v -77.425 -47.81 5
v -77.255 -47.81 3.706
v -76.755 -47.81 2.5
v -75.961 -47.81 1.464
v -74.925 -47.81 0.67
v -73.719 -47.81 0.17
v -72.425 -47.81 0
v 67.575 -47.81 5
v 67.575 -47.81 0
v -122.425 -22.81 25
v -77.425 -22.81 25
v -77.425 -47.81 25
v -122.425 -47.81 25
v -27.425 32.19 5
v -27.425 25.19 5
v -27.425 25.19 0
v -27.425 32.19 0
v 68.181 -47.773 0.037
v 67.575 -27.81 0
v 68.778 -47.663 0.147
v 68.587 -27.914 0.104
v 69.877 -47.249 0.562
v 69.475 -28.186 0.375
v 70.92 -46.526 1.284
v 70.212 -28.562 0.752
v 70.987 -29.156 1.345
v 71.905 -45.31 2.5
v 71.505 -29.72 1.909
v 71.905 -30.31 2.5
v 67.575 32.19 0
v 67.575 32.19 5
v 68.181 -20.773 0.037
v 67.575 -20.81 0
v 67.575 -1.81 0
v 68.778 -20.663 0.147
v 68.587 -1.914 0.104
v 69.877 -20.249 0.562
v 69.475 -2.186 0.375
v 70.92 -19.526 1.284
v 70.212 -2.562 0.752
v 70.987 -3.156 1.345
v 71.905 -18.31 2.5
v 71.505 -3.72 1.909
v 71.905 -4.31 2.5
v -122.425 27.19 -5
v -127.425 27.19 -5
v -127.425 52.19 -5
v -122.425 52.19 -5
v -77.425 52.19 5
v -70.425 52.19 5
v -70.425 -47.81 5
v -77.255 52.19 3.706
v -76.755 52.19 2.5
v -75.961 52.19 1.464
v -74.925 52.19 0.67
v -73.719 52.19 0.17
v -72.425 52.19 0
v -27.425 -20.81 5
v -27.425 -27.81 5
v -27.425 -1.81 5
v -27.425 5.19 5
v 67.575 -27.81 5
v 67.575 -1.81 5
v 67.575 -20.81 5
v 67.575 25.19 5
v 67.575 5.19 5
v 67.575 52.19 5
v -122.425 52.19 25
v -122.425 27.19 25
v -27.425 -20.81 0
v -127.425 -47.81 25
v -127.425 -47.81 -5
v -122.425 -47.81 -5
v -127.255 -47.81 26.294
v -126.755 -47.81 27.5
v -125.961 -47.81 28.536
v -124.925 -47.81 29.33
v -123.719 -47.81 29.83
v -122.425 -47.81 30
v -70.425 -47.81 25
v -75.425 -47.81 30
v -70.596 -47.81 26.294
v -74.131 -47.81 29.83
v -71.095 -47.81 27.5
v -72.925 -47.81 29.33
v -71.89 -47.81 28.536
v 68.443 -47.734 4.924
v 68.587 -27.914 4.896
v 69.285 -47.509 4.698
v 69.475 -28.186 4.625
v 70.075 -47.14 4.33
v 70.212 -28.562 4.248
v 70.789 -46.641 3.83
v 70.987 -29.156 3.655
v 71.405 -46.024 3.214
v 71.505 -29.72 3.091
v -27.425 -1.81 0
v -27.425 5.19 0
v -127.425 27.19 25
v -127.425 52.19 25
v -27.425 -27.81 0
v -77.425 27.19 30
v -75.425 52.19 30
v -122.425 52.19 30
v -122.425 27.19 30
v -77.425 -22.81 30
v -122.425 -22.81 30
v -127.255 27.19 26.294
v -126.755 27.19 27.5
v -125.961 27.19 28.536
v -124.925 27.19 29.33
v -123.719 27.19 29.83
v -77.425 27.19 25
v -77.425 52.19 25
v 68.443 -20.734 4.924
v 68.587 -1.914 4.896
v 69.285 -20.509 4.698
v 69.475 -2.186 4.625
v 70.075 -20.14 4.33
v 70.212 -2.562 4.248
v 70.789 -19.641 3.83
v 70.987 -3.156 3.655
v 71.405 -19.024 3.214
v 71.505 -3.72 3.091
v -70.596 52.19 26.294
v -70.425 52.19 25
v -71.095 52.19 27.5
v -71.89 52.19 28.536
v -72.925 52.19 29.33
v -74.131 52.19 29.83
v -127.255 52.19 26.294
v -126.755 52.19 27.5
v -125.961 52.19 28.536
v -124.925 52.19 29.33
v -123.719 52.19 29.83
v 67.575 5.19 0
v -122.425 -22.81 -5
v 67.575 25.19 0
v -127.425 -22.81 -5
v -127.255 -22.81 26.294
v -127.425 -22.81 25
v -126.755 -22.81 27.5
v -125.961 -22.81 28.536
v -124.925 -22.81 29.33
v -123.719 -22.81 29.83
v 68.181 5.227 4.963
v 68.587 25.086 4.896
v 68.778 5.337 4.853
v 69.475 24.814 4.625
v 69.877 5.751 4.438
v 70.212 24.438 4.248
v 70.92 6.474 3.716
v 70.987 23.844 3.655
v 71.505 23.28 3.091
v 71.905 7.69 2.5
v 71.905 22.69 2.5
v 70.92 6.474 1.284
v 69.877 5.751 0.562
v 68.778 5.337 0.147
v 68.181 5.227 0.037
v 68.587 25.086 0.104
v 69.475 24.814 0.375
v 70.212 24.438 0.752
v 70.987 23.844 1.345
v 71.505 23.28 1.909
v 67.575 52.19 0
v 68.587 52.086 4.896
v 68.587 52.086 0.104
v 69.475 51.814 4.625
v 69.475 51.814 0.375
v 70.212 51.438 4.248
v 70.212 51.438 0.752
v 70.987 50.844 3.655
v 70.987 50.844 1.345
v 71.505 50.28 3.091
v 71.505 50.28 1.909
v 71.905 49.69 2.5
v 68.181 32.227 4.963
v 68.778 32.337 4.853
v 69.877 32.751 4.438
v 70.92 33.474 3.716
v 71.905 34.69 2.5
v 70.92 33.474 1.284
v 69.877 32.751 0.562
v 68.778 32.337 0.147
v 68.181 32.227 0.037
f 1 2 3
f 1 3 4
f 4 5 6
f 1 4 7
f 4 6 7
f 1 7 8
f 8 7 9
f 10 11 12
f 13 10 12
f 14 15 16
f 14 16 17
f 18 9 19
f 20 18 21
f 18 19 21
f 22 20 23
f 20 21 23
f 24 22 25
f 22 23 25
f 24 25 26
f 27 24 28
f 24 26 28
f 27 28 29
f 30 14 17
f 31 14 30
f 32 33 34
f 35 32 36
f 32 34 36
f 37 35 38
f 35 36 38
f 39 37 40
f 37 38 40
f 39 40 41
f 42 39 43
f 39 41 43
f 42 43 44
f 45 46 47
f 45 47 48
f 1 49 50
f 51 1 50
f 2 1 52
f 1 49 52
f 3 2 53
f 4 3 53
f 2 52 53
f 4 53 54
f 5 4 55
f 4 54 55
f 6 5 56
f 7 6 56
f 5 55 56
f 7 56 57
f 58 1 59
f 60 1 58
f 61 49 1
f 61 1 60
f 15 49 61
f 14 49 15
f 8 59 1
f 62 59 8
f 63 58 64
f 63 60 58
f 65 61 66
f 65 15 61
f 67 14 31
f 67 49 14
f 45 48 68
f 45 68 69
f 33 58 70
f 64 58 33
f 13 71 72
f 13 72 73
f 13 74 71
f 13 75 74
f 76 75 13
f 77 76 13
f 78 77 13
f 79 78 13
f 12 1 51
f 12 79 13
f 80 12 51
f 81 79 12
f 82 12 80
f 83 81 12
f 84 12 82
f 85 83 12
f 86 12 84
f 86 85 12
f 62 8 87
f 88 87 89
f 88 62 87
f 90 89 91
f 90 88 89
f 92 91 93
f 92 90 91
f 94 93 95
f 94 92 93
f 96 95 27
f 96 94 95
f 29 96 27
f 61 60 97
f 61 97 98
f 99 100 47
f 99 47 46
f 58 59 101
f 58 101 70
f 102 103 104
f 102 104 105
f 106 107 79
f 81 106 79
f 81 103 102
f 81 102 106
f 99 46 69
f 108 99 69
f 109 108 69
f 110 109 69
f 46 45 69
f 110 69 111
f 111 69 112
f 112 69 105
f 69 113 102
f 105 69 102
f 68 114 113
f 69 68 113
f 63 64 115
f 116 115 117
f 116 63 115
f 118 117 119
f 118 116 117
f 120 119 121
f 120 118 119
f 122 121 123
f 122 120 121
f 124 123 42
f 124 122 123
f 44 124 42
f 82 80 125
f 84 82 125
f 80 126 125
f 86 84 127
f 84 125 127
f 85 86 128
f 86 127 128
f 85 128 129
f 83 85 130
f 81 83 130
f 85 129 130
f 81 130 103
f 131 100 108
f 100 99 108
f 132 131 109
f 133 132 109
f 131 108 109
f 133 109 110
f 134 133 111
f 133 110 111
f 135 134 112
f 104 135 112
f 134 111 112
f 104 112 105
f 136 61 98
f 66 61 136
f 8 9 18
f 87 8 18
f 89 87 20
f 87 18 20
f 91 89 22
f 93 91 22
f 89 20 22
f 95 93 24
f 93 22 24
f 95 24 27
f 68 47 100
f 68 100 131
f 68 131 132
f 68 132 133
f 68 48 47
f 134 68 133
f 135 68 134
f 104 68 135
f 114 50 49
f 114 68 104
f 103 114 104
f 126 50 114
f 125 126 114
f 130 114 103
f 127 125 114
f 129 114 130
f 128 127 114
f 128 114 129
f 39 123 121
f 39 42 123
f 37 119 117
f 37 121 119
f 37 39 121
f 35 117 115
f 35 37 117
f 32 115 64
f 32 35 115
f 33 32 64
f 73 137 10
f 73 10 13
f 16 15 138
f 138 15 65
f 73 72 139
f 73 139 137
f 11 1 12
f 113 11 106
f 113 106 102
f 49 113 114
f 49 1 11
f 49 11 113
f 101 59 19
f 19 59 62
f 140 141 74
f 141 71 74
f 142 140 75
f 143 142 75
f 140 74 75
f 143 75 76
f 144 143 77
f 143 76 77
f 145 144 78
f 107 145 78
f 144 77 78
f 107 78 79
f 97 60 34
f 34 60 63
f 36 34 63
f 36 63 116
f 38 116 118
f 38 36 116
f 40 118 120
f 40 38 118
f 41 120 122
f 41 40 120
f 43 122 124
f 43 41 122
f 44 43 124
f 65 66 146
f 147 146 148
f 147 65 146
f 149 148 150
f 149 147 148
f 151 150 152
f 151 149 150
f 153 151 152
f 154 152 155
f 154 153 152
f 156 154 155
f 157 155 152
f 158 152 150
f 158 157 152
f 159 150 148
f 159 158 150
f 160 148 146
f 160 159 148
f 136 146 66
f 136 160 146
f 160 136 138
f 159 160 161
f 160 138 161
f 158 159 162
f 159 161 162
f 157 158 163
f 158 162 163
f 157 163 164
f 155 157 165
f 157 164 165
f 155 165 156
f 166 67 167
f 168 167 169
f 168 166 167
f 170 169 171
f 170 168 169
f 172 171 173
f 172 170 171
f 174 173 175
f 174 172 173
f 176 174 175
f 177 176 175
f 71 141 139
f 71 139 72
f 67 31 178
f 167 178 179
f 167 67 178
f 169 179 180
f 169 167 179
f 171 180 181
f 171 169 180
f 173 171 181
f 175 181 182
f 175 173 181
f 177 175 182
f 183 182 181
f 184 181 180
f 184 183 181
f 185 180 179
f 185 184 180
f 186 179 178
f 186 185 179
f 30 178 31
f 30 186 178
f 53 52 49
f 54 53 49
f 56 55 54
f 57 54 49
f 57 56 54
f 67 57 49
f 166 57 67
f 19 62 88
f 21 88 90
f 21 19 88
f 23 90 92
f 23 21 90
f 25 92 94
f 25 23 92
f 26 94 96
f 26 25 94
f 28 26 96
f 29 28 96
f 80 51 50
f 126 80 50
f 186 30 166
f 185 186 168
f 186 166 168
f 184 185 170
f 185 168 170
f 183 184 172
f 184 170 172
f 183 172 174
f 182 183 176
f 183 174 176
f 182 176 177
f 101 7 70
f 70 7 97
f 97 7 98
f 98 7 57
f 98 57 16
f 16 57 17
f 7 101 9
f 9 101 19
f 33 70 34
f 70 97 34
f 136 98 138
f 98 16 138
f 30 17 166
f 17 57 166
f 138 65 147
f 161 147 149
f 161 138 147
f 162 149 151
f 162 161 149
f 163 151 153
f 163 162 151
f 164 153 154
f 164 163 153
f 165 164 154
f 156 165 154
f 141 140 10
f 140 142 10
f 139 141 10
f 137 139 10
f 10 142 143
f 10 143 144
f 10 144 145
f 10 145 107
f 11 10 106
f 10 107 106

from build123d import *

# Parameters (mm, degrees)
F0_W         = 150
F0_H         = 100
F1_DEPTH     = 5
F2_W         = 100
F2_H         = 7
F3_DEPTH     = 5.001
F4_W         = 7
F4_H         = 100
F5_DEPTH     = 25
F6_W         = 25
F6_H         = 5
F7_DEPTH     = 50
F9_W         = 5
F9_H         = 25
F8_W         = 5
F8_H         = 25
F10_DEPTH    = 30
F11_R        = 4.99999
F11_2_R      = 4.99999
F12_T1_DEPTH = 45
F12_T3_DEPTH = 30
F12_T5_DEPTH = 44
F12_T7_DEPTH = 45
F12_T9_DEPTH = 45


# Not quite as in the source:
# - a fillet or chamfer that OpenCascade refuses, or shapes differently, is made with other operations: its cross-section is extruded or revolved along the edge and cut away or added
# - a fillet or chamfer is up to 0.001 mm smaller than in the source, because OpenCascade refuses the exact size


with BuildPart() as f1:
    # F0 (on Top) → F1 (new body)
    with BuildSketch(Plane.XY):
        with Locations((-2.425318882, 2.1896716207)):
            Rectangle(F0_W, F0_H)
    extrude(amount=F1_DEPTH)

    # F2 (on face) → F3 (cut, through all)
    with BuildSketch(Plane.XY.offset(5)):
        with Locations((22.574681118, 28.6896716207)):
            Rectangle(F2_W, F2_H)
        with Locations((22.574681118, 1.6896716207)):
            Rectangle(F2_W, F2_H)
        with Locations((22.574681118, -24.3103283793)):
            Rectangle(F2_W, F2_H)
    extrude(amount=-F3_DEPTH, mode=Mode.SUBTRACT)

    # F11#2 (radius 5 in the source; OpenCascade refuses exactly that, so slightly less here)
    f11_2_edges = [f1.edges().sort_by_distance(p)[0] for p in [
        (-77.425319, 2.189672, 0),
    ]]
    fillet(f11_2_edges, radius=F11_2_R)

    # F12: fillet of radius 5 on 16 edges, made by hand

    # F12_s2 → F12_t1 (cut)
    with BuildSketch(Plane.XZ.offset(15.3103283793)):
        with BuildLine():
            ThreePointArc((67.574681118, 0), (71.110215024, 1.4644660941), (72.574681118, 5))
            Line((72.574681118, 5), (72.574681118, 0))
            Line((72.574681118, 0), (67.574681118, 0))
        make_face()
        with BuildLine():
            ThreePointArc((67.574681118, 5), (71.110215024, 3.5355339059), (72.574681118, 0))
            Line((72.574681118, 0), (72.574681118, 5))
            Line((72.574681118, 5), (67.574681118, 5))
        make_face()
    extrude(amount=F12_T1_DEPTH, mode=Mode.SUBTRACT)

    # F12_s4 → F12_t3 (cut)
    with BuildSketch(Plane.XY.offset(-12.5)):
        with BuildLine():
            ThreePointArc((67.574681118, -27.8103283793), (71.110215024, -29.2747944733), (72.574681118, -32.8103283793))
            Line((72.574681118, -32.8103283793), (72.574681118, -27.8103283793))
            Line((72.574681118, -27.8103283793), (67.574681118, -27.8103283793))
        make_face()
        with BuildLine():
            ThreePointArc((67.574681118, -47.8103283793), (71.110215024, -46.3458622852), (72.574681118, -42.8103283793))
            Line((72.574681118, -42.8103283793), (72.574681118, -47.8103283793))
            Line((72.574681118, -47.8103283793), (67.574681118, -47.8103283793))
        make_face()
        with BuildLine():
            ThreePointArc((67.574681118, -1.8103283793), (71.110215024, -3.2747944733), (72.574681118, -6.8103283793))
            Line((72.574681118, -6.8103283793), (72.574681118, -1.8103283793))
            Line((72.574681118, -1.8103283793), (67.574681118, -1.8103283793))
        make_face()
        with BuildLine():
            ThreePointArc((72.574681118, -15.8103283793), (71.110215024, -19.3458622852), (67.574681118, -20.8103283793))
            Line((67.574681118, -20.8103283793), (72.574681118, -20.8103283793))
            Line((72.574681118, -20.8103283793), (72.574681118, -15.8103283793))
        make_face()
        with BuildLine():
            ThreePointArc((67.574681118, 25.1896716207), (71.110215024, 23.7252055267), (72.574681118, 20.1896716207))
            Line((72.574681118, 20.1896716207), (72.574681118, 25.1896716207))
            Line((72.574681118, 25.1896716207), (67.574681118, 25.1896716207))
        make_face()
        with BuildLine():
            ThreePointArc((72.574681118, 10.1896716207), (71.110215024, 6.6541377148), (67.574681118, 5.1896716207))
            Line((67.574681118, 5.1896716207), (72.574681118, 5.1896716207))
            Line((72.574681118, 5.1896716207), (72.574681118, 10.1896716207))
        make_face()
        with BuildLine():
            ThreePointArc((67.574681118, 52.1896716207), (71.110215024, 50.7252055267), (72.574681118, 47.1896716207))
            Line((72.574681118, 47.1896716207), (72.574681118, 52.1896716207))
            Line((72.574681118, 52.1896716207), (67.574681118, 52.1896716207))
        make_face()
        with BuildLine():
            ThreePointArc((72.574681118, 37.1896716207), (71.110215024, 33.6541377148), (67.574681118, 32.1896716207))
            Line((67.574681118, 32.1896716207), (72.574681118, 32.1896716207))
            Line((72.574681118, 32.1896716207), (72.574681118, 37.1896716207))
        make_face()
    extrude(amount=F12_T3_DEPTH, mode=Mode.SUBTRACT)

    # F12_s6 → F12_t5 (cut)
    with BuildSketch(Plane.XZ.offset(-10.6896716207)):
        with BuildLine():
            ThreePointArc((67.574681118, 0), (71.110215024, 1.4644660941), (72.574681118, 5))
            Line((72.574681118, 5), (72.574681118, 0))
            Line((72.574681118, 0), (67.574681118, 0))
        make_face()
        with BuildLine():
            ThreePointArc((67.574681118, 5), (71.110215024, 3.5355339059), (72.574681118, 0))
            Line((72.574681118, 0), (72.574681118, 5))
            Line((72.574681118, 5), (67.574681118, 5))
        make_face()
    extrude(amount=F12_T5_DEPTH, mode=Mode.SUBTRACT)

    # F12_s8 → F12_t7 (cut)
    with BuildSketch(Plane.XZ.offset(-37.6896716207)):
        with BuildLine():
            ThreePointArc((67.574681118, 0), (71.110215024, 1.4644660941), (72.574681118, 5))
            Line((72.574681118, 5), (72.574681118, 0))
            Line((72.574681118, 0), (67.574681118, 0))
        make_face()
        with BuildLine():
            ThreePointArc((67.574681118, 5), (71.110215024, 3.5355339059), (72.574681118, 0))
            Line((72.574681118, 0), (72.574681118, 5))
            Line((72.574681118, 5), (67.574681118, 5))
        make_face()
    extrude(amount=F12_T7_DEPTH, mode=Mode.SUBTRACT)

    # F12_s10 → F12_t9 (cut)
    with BuildSketch(Plane.XZ.offset(-64.6896716207)):
        with BuildLine():
            ThreePointArc((67.574681118, 0), (71.110215024, 1.4644660941), (72.574681118, 5))
            Line((72.574681118, 5), (72.574681118, 0))
            Line((72.574681118, 0), (67.574681118, 0))
        make_face()
        with BuildLine():
            ThreePointArc((67.574681118, 5), (71.110215024, 3.5355339059), (72.574681118, 0))
            Line((72.574681118, 0), (72.574681118, 5))
            Line((72.574681118, 5), (67.574681118, 5))
        make_face()
    extrude(amount=F12_T9_DEPTH, mode=Mode.SUBTRACT)


with BuildPart() as f5:
    # F4 (on face) → F5 (new body)
    with BuildSketch(Plane.XY.offset(5)):
        with Locations((-73.925318882, 2.1896716207)):
            Rectangle(F4_W, F4_H)
    extrude(amount=F5_DEPTH)

    # F6 (on face) → F7 (join)
    with BuildSketch(Plane(origin=(-77.425318882, 0, 0), x_dir=(0, -1, 0), z_dir=(-1, 0, 0))):
        with Locations((-39.6896716207, 27.5)):
            Rectangle(F6_W, F6_H)
        with Locations((35.3103283793, 27.5)):
            Rectangle(F6_W, F6_H)
    extrude(amount=F7_DEPTH)

    # F9 (on face) + F8 (on face) → F10 (join)
    with BuildSketch(Plane(origin=(0, 0, 25), x_dir=(1, 0, 0), z_dir=(0, 0, -1))):
        with Locations((-124.925318882, 35.3103283793)):
            Rectangle(F9_W, F9_H)
    with BuildSketch(Plane(origin=(0, 0, 25), x_dir=(1, 0, 0), z_dir=(0, 0, -1))):
        with Locations((-124.925318882, -39.6896716207)):
            Rectangle(F8_W, F8_H)
    extrude(amount=F10_DEPTH)

    # F11 (radius 5 in the source; OpenCascade refuses exactly that, so slightly less here)
    f11_edges = [f5.edges().sort_by_distance(p)[0] for p in [
        (-127.425319, 39.689672, 30),
        (-127.425319, -35.310328, 30),
        (-70.425319, 2.189672, 30),
    ]]
    fillet(f11_edges, radius=F11_R)


solid = Compound([f1.part, f5.part])
